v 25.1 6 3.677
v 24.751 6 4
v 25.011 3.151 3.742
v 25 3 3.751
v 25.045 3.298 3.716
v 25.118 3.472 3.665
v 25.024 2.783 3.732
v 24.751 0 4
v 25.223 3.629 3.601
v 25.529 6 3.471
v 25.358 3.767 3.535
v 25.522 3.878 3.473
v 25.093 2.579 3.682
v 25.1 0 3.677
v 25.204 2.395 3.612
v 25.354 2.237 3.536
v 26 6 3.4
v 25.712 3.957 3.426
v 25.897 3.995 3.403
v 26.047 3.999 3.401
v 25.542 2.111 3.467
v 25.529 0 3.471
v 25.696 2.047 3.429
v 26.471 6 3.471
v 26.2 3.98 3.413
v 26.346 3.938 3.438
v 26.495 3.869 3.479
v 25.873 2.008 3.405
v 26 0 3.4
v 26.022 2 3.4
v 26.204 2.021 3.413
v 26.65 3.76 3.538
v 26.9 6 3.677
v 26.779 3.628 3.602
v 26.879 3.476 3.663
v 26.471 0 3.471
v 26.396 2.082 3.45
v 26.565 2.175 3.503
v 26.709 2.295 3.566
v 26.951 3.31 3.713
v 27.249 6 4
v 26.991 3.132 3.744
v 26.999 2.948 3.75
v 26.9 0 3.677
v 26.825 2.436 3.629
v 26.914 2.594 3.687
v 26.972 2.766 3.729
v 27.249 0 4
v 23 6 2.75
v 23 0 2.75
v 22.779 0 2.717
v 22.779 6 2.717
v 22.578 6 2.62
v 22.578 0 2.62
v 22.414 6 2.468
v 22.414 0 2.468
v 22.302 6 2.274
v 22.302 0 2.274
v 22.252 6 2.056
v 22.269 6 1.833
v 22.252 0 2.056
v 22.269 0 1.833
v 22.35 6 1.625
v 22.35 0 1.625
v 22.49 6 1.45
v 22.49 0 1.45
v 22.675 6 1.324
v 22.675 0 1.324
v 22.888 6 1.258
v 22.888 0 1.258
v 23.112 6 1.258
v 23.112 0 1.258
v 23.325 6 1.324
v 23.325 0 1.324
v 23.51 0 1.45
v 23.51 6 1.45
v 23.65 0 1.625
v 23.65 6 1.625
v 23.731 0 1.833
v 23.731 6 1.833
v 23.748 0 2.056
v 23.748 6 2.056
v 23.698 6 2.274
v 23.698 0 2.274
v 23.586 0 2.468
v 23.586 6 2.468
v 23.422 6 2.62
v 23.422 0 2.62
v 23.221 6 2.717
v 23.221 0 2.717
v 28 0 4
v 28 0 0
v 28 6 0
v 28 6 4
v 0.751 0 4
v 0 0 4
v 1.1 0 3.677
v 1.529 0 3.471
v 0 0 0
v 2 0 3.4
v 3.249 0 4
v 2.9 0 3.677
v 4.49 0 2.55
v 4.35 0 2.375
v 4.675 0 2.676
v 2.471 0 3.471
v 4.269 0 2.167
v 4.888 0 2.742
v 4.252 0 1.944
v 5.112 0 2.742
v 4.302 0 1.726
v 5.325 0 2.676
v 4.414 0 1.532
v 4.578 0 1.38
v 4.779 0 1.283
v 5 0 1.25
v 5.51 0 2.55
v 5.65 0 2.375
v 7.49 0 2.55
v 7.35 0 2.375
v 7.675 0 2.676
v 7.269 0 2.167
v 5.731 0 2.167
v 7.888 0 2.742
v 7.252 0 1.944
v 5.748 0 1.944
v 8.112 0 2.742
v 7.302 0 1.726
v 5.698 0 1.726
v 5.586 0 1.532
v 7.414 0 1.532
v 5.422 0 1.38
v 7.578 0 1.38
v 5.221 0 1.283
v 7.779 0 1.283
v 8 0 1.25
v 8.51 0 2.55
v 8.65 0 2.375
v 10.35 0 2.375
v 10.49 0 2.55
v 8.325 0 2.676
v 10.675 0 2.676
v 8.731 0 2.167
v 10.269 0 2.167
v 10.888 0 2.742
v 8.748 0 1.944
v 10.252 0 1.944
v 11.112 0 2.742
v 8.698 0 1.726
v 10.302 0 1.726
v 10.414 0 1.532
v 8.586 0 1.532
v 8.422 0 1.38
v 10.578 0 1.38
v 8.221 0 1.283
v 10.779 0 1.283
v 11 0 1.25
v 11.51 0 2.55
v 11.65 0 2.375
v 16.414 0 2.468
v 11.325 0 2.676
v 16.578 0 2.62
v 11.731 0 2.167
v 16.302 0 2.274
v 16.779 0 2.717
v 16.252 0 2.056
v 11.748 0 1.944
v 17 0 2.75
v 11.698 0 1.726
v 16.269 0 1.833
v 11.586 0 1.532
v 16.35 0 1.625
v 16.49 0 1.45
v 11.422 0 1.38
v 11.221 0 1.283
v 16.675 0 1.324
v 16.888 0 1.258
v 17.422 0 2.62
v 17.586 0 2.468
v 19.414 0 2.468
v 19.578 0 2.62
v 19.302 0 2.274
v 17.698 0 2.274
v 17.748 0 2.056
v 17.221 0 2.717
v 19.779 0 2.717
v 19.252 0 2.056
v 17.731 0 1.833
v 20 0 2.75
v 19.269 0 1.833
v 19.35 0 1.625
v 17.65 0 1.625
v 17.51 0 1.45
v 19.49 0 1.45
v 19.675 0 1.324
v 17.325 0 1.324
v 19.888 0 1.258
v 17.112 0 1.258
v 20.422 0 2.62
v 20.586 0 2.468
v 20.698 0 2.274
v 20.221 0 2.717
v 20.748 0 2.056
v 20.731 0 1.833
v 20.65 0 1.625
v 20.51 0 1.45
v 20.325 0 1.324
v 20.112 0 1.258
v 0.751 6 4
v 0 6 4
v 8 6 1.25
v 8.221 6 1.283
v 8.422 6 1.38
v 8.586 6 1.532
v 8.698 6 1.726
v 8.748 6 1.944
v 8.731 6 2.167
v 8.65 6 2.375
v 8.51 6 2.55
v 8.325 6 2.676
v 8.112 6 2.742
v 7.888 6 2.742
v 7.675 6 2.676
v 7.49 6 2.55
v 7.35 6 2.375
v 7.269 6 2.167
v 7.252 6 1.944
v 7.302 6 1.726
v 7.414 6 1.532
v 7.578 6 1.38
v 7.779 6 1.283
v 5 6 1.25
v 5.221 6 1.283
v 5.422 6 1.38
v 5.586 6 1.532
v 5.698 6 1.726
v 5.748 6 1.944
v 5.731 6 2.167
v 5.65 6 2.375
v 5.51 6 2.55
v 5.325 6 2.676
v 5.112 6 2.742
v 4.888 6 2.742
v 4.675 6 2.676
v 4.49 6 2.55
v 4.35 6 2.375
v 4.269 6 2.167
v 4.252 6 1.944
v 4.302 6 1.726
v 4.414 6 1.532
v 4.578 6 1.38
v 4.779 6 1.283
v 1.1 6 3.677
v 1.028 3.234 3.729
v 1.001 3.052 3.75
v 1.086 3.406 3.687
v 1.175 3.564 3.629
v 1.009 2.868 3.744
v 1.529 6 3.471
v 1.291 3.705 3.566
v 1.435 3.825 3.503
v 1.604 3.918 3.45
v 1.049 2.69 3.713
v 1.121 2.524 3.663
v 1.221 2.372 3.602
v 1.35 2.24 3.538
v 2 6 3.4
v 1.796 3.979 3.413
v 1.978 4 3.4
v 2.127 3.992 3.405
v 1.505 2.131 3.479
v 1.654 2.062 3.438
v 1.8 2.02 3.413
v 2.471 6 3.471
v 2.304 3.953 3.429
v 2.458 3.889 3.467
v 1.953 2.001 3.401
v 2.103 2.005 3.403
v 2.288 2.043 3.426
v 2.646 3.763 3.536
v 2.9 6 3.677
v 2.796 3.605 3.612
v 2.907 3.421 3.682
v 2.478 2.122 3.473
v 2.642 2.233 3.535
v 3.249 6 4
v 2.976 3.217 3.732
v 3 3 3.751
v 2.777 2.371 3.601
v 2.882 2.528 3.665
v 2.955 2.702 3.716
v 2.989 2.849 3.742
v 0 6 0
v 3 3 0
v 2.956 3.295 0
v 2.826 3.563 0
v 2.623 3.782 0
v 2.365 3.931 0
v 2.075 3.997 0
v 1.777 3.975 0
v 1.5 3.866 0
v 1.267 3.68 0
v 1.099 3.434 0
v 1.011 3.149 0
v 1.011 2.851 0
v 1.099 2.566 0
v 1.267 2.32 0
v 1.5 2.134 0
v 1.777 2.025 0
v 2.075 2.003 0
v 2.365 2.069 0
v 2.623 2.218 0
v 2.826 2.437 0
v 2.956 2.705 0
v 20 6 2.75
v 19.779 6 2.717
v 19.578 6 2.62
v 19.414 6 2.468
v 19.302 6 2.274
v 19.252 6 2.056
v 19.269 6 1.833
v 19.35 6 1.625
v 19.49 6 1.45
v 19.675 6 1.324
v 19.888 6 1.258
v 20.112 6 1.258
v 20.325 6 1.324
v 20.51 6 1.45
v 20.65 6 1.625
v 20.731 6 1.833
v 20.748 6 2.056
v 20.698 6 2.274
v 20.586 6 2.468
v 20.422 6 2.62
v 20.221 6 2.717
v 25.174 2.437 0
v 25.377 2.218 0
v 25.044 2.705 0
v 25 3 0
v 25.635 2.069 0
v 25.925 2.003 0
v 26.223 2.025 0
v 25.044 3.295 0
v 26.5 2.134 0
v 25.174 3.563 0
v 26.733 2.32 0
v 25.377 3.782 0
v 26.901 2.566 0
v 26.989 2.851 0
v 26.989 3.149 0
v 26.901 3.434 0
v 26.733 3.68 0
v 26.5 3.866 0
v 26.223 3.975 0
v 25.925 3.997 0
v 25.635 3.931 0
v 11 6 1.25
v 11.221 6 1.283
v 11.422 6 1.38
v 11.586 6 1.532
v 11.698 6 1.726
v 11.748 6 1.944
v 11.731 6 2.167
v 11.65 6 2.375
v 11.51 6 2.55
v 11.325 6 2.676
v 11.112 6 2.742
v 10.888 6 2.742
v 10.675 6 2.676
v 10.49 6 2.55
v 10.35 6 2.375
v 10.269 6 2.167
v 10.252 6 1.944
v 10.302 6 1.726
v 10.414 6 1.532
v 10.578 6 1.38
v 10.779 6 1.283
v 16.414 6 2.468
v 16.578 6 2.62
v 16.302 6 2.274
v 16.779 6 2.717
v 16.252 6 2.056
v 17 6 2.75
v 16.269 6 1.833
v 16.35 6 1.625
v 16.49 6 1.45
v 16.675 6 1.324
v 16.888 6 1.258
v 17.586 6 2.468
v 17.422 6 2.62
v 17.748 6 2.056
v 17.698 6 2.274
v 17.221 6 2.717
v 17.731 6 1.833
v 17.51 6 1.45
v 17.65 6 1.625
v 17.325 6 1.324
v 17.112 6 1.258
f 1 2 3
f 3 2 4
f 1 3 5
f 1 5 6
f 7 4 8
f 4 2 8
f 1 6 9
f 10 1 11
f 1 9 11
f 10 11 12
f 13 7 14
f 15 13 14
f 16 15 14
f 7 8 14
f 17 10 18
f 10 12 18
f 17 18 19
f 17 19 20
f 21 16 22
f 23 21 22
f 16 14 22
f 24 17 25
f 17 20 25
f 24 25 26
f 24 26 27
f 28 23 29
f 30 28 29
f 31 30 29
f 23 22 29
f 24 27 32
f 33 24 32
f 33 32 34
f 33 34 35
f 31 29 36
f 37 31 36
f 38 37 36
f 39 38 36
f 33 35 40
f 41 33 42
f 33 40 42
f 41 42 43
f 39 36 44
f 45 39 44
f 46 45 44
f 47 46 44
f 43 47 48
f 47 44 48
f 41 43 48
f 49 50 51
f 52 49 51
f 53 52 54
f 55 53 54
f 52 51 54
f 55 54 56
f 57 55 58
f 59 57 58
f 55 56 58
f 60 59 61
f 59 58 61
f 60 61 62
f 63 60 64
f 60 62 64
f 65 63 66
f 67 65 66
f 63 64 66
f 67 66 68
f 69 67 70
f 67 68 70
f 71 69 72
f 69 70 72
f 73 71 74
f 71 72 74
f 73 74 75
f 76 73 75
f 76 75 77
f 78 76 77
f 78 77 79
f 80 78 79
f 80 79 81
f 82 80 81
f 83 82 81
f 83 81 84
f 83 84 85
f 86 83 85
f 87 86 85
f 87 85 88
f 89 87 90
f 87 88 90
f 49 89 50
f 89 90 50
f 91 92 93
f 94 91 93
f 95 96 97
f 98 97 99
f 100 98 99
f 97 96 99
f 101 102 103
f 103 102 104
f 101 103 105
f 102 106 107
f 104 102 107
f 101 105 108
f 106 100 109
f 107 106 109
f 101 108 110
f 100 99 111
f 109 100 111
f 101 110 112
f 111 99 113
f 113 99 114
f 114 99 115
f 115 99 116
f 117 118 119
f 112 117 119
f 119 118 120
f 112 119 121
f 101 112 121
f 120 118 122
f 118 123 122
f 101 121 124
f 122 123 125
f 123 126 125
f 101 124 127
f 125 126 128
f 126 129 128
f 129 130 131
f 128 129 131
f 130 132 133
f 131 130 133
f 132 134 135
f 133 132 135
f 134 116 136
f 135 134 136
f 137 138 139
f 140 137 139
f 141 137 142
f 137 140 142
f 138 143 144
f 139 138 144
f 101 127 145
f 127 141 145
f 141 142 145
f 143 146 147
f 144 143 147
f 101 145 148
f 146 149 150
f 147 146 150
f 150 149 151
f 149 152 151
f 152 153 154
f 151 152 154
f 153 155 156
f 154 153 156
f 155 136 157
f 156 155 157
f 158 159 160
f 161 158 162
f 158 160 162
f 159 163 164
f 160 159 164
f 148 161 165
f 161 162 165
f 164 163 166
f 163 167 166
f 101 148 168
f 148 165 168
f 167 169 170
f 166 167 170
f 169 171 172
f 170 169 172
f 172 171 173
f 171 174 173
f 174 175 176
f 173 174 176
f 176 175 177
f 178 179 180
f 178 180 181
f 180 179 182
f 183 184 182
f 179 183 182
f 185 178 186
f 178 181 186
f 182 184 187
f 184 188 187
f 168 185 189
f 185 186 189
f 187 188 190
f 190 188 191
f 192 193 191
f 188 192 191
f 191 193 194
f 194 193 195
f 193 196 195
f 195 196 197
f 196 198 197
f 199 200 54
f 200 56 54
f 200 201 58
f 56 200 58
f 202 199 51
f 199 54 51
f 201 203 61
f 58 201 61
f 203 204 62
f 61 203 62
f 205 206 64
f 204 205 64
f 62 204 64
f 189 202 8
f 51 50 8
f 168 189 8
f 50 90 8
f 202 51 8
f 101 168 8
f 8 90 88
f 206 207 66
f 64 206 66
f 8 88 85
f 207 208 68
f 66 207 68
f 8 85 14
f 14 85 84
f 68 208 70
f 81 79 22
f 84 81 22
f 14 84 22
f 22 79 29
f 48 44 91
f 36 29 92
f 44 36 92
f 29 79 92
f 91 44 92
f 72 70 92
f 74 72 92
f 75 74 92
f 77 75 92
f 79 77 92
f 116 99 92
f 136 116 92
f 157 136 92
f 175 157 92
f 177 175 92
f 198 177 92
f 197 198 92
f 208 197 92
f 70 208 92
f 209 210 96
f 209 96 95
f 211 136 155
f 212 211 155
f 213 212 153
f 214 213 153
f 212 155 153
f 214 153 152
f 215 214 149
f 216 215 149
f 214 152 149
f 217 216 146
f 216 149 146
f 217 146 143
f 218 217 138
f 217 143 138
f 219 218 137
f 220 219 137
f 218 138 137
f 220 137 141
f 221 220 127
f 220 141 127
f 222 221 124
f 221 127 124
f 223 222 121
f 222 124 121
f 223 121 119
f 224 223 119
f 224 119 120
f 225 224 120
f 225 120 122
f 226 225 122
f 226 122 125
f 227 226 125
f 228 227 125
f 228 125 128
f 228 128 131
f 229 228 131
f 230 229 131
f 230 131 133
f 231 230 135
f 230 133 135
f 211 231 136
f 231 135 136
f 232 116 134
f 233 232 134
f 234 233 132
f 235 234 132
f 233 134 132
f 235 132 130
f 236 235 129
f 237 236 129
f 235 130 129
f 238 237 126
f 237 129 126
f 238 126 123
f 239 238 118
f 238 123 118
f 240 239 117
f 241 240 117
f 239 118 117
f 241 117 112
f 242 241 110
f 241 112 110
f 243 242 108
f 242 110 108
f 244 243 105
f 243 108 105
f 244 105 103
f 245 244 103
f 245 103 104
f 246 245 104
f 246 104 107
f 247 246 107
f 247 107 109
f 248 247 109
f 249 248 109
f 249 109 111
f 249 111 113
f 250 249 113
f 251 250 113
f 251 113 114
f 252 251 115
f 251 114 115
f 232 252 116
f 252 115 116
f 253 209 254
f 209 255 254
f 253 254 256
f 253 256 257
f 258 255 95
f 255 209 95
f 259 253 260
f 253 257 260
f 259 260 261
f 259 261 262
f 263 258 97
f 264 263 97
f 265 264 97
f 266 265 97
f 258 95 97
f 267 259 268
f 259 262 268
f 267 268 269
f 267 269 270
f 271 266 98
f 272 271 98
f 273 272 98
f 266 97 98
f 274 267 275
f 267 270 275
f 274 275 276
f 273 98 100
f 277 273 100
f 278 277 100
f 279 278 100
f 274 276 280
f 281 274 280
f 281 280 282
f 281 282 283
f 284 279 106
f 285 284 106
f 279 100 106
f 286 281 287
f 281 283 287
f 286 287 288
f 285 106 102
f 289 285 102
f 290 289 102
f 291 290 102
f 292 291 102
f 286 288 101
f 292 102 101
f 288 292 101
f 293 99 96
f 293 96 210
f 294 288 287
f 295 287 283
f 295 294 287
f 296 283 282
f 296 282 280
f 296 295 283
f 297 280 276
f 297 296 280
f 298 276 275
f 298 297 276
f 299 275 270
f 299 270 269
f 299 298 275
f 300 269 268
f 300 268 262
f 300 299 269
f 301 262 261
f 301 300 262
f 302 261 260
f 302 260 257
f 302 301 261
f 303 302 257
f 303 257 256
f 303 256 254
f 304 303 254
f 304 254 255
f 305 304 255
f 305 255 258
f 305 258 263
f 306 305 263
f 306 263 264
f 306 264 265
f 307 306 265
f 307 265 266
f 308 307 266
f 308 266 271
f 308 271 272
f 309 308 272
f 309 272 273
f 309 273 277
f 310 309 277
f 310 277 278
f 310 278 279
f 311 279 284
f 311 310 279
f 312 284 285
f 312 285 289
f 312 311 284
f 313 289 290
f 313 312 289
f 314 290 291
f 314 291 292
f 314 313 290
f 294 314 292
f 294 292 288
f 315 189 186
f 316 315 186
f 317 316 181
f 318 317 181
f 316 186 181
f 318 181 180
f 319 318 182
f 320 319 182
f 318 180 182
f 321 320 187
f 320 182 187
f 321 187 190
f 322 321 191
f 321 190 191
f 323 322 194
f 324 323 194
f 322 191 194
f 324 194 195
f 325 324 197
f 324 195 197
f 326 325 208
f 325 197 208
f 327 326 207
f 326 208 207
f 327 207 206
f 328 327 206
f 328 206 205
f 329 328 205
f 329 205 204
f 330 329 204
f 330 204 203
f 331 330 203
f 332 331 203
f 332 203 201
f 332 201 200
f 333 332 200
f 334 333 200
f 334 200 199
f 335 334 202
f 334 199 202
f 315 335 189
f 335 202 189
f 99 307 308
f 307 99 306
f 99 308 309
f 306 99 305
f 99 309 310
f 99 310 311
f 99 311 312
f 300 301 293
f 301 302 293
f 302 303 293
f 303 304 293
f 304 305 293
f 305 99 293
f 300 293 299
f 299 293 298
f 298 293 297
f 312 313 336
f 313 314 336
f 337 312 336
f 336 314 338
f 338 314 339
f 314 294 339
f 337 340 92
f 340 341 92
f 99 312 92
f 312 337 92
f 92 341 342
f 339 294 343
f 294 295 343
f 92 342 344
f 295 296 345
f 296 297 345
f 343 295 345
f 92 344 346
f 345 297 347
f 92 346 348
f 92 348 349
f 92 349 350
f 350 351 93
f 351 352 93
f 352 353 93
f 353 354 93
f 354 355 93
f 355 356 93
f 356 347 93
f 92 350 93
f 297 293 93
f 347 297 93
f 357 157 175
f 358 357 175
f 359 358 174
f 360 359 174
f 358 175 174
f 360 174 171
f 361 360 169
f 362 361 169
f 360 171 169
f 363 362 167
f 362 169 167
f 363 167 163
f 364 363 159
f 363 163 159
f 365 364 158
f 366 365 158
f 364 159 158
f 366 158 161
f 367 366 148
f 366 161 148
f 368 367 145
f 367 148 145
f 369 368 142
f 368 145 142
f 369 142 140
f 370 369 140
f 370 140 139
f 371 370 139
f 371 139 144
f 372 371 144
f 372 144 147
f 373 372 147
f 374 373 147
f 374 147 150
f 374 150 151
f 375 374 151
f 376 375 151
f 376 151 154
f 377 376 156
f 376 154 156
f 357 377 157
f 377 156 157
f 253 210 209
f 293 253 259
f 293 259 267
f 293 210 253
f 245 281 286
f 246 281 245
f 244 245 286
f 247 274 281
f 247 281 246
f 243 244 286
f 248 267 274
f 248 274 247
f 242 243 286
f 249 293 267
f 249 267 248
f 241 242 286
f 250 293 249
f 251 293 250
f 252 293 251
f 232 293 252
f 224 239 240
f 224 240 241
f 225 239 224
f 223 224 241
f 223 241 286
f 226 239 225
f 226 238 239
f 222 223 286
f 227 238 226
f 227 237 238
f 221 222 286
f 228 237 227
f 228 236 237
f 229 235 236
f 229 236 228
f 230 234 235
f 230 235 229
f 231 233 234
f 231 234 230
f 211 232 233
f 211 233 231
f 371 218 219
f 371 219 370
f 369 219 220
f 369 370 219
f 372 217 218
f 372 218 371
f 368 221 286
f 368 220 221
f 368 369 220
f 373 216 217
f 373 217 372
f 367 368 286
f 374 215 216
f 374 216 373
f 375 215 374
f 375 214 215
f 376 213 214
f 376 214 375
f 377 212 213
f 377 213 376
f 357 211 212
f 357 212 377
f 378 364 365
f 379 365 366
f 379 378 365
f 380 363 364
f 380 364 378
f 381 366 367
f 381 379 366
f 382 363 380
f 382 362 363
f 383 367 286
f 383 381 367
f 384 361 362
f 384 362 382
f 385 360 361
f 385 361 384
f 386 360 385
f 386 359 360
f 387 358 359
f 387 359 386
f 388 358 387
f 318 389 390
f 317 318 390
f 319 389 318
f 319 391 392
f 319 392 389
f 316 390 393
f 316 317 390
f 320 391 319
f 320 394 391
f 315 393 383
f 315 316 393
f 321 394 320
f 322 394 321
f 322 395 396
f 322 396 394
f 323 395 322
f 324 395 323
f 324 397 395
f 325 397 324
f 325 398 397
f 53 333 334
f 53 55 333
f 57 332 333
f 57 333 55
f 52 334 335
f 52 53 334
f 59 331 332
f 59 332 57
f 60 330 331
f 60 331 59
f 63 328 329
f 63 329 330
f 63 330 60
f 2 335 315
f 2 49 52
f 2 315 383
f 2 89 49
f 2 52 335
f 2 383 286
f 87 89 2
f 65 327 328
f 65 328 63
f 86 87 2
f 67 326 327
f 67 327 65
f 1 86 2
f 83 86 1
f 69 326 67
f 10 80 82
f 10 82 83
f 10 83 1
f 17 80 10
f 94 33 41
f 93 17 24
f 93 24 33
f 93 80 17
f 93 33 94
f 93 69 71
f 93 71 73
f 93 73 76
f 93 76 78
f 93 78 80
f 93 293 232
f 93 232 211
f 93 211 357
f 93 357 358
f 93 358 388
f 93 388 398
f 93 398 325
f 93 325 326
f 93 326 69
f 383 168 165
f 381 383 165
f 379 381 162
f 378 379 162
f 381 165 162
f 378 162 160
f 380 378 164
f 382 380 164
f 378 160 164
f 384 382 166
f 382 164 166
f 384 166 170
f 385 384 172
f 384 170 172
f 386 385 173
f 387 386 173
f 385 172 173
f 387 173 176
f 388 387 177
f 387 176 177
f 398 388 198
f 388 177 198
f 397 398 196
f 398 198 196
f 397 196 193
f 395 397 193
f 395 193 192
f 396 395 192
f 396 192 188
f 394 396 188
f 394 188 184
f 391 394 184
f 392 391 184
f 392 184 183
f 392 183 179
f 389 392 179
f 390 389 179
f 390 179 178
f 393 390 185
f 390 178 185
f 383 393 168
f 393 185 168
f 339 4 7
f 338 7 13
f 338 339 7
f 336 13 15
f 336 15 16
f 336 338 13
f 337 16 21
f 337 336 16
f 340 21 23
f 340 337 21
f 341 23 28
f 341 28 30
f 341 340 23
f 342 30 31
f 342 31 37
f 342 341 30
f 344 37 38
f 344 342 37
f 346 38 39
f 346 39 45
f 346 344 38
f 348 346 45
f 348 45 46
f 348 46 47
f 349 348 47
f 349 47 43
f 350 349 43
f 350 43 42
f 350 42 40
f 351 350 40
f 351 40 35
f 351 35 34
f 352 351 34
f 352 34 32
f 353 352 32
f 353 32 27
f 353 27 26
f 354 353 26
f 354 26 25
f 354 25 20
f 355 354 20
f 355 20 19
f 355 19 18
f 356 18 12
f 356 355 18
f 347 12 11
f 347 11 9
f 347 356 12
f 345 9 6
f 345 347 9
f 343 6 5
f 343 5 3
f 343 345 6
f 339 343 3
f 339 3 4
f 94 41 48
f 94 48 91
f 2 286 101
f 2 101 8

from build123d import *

# Parameters (mm, degrees)
CROQUIS1_W              = 28
CROQUIS1_H              = 6
CROQUIS1_R              = 1
SALIENTE_EXTRUIR1_DEPTH = 4
CROQUIS2_R              = 1.6
CROQUIS2_R_2            = 0.75
CORTAR_EXTRUIR1_DEPTH   = 6


with BuildPart() as part:
    # Croquis1 → Saliente-Extruir1 (new body)
    with BuildSketch(Plane.XY):
        with Locations((14, 3)):
            Rectangle(CROQUIS1_W, CROQUIS1_H)
        with Locations((2, 3)):
            Circle(CROQUIS1_R, mode=Mode.SUBTRACT)
        with Locations(Location((26, 3, 0), (0, 0, 180))):
            Circle(CROQUIS1_R, mode=Mode.SUBTRACT)
    extrude(amount=SALIENTE_EXTRUIR1_DEPTH)

    # Croquis2 → Cortar-Extruir1 (cut)
    with BuildSketch(Plane.XZ):
        with Locations((2, 5)):
            Circle(CROQUIS2_R)
        with Locations(Location((11, 2, 0), (0, 0, 270))):
            Circle(CROQUIS2_R_2)
        with Locations(Location((8, 2, 0), (0, 0, 270))):
            Circle(CROQUIS2_R_2)
        with Locations(Location((5, 2, 0), (0, 0, 270))):
            Circle(CROQUIS2_R_2)
        with Locations(Location((23, 2, 0), (0, 0, 90))):
            Circle(CROQUIS2_R_2)
        with Locations(Location((20, 2, 0), (0, 0, 90))):
            Circle(CROQUIS2_R_2)
        with Locations(Location((17, 2, 0), (0, 0, 90))):
            Circle(CROQUIS2_R_2)
        with Locations((26, 5)):
            Circle(CROQUIS2_R)
    extrude(amount=-CORTAR_EXTRUIR1_DEPTH, mode=Mode.SUBTRACT)


solid = part.part
